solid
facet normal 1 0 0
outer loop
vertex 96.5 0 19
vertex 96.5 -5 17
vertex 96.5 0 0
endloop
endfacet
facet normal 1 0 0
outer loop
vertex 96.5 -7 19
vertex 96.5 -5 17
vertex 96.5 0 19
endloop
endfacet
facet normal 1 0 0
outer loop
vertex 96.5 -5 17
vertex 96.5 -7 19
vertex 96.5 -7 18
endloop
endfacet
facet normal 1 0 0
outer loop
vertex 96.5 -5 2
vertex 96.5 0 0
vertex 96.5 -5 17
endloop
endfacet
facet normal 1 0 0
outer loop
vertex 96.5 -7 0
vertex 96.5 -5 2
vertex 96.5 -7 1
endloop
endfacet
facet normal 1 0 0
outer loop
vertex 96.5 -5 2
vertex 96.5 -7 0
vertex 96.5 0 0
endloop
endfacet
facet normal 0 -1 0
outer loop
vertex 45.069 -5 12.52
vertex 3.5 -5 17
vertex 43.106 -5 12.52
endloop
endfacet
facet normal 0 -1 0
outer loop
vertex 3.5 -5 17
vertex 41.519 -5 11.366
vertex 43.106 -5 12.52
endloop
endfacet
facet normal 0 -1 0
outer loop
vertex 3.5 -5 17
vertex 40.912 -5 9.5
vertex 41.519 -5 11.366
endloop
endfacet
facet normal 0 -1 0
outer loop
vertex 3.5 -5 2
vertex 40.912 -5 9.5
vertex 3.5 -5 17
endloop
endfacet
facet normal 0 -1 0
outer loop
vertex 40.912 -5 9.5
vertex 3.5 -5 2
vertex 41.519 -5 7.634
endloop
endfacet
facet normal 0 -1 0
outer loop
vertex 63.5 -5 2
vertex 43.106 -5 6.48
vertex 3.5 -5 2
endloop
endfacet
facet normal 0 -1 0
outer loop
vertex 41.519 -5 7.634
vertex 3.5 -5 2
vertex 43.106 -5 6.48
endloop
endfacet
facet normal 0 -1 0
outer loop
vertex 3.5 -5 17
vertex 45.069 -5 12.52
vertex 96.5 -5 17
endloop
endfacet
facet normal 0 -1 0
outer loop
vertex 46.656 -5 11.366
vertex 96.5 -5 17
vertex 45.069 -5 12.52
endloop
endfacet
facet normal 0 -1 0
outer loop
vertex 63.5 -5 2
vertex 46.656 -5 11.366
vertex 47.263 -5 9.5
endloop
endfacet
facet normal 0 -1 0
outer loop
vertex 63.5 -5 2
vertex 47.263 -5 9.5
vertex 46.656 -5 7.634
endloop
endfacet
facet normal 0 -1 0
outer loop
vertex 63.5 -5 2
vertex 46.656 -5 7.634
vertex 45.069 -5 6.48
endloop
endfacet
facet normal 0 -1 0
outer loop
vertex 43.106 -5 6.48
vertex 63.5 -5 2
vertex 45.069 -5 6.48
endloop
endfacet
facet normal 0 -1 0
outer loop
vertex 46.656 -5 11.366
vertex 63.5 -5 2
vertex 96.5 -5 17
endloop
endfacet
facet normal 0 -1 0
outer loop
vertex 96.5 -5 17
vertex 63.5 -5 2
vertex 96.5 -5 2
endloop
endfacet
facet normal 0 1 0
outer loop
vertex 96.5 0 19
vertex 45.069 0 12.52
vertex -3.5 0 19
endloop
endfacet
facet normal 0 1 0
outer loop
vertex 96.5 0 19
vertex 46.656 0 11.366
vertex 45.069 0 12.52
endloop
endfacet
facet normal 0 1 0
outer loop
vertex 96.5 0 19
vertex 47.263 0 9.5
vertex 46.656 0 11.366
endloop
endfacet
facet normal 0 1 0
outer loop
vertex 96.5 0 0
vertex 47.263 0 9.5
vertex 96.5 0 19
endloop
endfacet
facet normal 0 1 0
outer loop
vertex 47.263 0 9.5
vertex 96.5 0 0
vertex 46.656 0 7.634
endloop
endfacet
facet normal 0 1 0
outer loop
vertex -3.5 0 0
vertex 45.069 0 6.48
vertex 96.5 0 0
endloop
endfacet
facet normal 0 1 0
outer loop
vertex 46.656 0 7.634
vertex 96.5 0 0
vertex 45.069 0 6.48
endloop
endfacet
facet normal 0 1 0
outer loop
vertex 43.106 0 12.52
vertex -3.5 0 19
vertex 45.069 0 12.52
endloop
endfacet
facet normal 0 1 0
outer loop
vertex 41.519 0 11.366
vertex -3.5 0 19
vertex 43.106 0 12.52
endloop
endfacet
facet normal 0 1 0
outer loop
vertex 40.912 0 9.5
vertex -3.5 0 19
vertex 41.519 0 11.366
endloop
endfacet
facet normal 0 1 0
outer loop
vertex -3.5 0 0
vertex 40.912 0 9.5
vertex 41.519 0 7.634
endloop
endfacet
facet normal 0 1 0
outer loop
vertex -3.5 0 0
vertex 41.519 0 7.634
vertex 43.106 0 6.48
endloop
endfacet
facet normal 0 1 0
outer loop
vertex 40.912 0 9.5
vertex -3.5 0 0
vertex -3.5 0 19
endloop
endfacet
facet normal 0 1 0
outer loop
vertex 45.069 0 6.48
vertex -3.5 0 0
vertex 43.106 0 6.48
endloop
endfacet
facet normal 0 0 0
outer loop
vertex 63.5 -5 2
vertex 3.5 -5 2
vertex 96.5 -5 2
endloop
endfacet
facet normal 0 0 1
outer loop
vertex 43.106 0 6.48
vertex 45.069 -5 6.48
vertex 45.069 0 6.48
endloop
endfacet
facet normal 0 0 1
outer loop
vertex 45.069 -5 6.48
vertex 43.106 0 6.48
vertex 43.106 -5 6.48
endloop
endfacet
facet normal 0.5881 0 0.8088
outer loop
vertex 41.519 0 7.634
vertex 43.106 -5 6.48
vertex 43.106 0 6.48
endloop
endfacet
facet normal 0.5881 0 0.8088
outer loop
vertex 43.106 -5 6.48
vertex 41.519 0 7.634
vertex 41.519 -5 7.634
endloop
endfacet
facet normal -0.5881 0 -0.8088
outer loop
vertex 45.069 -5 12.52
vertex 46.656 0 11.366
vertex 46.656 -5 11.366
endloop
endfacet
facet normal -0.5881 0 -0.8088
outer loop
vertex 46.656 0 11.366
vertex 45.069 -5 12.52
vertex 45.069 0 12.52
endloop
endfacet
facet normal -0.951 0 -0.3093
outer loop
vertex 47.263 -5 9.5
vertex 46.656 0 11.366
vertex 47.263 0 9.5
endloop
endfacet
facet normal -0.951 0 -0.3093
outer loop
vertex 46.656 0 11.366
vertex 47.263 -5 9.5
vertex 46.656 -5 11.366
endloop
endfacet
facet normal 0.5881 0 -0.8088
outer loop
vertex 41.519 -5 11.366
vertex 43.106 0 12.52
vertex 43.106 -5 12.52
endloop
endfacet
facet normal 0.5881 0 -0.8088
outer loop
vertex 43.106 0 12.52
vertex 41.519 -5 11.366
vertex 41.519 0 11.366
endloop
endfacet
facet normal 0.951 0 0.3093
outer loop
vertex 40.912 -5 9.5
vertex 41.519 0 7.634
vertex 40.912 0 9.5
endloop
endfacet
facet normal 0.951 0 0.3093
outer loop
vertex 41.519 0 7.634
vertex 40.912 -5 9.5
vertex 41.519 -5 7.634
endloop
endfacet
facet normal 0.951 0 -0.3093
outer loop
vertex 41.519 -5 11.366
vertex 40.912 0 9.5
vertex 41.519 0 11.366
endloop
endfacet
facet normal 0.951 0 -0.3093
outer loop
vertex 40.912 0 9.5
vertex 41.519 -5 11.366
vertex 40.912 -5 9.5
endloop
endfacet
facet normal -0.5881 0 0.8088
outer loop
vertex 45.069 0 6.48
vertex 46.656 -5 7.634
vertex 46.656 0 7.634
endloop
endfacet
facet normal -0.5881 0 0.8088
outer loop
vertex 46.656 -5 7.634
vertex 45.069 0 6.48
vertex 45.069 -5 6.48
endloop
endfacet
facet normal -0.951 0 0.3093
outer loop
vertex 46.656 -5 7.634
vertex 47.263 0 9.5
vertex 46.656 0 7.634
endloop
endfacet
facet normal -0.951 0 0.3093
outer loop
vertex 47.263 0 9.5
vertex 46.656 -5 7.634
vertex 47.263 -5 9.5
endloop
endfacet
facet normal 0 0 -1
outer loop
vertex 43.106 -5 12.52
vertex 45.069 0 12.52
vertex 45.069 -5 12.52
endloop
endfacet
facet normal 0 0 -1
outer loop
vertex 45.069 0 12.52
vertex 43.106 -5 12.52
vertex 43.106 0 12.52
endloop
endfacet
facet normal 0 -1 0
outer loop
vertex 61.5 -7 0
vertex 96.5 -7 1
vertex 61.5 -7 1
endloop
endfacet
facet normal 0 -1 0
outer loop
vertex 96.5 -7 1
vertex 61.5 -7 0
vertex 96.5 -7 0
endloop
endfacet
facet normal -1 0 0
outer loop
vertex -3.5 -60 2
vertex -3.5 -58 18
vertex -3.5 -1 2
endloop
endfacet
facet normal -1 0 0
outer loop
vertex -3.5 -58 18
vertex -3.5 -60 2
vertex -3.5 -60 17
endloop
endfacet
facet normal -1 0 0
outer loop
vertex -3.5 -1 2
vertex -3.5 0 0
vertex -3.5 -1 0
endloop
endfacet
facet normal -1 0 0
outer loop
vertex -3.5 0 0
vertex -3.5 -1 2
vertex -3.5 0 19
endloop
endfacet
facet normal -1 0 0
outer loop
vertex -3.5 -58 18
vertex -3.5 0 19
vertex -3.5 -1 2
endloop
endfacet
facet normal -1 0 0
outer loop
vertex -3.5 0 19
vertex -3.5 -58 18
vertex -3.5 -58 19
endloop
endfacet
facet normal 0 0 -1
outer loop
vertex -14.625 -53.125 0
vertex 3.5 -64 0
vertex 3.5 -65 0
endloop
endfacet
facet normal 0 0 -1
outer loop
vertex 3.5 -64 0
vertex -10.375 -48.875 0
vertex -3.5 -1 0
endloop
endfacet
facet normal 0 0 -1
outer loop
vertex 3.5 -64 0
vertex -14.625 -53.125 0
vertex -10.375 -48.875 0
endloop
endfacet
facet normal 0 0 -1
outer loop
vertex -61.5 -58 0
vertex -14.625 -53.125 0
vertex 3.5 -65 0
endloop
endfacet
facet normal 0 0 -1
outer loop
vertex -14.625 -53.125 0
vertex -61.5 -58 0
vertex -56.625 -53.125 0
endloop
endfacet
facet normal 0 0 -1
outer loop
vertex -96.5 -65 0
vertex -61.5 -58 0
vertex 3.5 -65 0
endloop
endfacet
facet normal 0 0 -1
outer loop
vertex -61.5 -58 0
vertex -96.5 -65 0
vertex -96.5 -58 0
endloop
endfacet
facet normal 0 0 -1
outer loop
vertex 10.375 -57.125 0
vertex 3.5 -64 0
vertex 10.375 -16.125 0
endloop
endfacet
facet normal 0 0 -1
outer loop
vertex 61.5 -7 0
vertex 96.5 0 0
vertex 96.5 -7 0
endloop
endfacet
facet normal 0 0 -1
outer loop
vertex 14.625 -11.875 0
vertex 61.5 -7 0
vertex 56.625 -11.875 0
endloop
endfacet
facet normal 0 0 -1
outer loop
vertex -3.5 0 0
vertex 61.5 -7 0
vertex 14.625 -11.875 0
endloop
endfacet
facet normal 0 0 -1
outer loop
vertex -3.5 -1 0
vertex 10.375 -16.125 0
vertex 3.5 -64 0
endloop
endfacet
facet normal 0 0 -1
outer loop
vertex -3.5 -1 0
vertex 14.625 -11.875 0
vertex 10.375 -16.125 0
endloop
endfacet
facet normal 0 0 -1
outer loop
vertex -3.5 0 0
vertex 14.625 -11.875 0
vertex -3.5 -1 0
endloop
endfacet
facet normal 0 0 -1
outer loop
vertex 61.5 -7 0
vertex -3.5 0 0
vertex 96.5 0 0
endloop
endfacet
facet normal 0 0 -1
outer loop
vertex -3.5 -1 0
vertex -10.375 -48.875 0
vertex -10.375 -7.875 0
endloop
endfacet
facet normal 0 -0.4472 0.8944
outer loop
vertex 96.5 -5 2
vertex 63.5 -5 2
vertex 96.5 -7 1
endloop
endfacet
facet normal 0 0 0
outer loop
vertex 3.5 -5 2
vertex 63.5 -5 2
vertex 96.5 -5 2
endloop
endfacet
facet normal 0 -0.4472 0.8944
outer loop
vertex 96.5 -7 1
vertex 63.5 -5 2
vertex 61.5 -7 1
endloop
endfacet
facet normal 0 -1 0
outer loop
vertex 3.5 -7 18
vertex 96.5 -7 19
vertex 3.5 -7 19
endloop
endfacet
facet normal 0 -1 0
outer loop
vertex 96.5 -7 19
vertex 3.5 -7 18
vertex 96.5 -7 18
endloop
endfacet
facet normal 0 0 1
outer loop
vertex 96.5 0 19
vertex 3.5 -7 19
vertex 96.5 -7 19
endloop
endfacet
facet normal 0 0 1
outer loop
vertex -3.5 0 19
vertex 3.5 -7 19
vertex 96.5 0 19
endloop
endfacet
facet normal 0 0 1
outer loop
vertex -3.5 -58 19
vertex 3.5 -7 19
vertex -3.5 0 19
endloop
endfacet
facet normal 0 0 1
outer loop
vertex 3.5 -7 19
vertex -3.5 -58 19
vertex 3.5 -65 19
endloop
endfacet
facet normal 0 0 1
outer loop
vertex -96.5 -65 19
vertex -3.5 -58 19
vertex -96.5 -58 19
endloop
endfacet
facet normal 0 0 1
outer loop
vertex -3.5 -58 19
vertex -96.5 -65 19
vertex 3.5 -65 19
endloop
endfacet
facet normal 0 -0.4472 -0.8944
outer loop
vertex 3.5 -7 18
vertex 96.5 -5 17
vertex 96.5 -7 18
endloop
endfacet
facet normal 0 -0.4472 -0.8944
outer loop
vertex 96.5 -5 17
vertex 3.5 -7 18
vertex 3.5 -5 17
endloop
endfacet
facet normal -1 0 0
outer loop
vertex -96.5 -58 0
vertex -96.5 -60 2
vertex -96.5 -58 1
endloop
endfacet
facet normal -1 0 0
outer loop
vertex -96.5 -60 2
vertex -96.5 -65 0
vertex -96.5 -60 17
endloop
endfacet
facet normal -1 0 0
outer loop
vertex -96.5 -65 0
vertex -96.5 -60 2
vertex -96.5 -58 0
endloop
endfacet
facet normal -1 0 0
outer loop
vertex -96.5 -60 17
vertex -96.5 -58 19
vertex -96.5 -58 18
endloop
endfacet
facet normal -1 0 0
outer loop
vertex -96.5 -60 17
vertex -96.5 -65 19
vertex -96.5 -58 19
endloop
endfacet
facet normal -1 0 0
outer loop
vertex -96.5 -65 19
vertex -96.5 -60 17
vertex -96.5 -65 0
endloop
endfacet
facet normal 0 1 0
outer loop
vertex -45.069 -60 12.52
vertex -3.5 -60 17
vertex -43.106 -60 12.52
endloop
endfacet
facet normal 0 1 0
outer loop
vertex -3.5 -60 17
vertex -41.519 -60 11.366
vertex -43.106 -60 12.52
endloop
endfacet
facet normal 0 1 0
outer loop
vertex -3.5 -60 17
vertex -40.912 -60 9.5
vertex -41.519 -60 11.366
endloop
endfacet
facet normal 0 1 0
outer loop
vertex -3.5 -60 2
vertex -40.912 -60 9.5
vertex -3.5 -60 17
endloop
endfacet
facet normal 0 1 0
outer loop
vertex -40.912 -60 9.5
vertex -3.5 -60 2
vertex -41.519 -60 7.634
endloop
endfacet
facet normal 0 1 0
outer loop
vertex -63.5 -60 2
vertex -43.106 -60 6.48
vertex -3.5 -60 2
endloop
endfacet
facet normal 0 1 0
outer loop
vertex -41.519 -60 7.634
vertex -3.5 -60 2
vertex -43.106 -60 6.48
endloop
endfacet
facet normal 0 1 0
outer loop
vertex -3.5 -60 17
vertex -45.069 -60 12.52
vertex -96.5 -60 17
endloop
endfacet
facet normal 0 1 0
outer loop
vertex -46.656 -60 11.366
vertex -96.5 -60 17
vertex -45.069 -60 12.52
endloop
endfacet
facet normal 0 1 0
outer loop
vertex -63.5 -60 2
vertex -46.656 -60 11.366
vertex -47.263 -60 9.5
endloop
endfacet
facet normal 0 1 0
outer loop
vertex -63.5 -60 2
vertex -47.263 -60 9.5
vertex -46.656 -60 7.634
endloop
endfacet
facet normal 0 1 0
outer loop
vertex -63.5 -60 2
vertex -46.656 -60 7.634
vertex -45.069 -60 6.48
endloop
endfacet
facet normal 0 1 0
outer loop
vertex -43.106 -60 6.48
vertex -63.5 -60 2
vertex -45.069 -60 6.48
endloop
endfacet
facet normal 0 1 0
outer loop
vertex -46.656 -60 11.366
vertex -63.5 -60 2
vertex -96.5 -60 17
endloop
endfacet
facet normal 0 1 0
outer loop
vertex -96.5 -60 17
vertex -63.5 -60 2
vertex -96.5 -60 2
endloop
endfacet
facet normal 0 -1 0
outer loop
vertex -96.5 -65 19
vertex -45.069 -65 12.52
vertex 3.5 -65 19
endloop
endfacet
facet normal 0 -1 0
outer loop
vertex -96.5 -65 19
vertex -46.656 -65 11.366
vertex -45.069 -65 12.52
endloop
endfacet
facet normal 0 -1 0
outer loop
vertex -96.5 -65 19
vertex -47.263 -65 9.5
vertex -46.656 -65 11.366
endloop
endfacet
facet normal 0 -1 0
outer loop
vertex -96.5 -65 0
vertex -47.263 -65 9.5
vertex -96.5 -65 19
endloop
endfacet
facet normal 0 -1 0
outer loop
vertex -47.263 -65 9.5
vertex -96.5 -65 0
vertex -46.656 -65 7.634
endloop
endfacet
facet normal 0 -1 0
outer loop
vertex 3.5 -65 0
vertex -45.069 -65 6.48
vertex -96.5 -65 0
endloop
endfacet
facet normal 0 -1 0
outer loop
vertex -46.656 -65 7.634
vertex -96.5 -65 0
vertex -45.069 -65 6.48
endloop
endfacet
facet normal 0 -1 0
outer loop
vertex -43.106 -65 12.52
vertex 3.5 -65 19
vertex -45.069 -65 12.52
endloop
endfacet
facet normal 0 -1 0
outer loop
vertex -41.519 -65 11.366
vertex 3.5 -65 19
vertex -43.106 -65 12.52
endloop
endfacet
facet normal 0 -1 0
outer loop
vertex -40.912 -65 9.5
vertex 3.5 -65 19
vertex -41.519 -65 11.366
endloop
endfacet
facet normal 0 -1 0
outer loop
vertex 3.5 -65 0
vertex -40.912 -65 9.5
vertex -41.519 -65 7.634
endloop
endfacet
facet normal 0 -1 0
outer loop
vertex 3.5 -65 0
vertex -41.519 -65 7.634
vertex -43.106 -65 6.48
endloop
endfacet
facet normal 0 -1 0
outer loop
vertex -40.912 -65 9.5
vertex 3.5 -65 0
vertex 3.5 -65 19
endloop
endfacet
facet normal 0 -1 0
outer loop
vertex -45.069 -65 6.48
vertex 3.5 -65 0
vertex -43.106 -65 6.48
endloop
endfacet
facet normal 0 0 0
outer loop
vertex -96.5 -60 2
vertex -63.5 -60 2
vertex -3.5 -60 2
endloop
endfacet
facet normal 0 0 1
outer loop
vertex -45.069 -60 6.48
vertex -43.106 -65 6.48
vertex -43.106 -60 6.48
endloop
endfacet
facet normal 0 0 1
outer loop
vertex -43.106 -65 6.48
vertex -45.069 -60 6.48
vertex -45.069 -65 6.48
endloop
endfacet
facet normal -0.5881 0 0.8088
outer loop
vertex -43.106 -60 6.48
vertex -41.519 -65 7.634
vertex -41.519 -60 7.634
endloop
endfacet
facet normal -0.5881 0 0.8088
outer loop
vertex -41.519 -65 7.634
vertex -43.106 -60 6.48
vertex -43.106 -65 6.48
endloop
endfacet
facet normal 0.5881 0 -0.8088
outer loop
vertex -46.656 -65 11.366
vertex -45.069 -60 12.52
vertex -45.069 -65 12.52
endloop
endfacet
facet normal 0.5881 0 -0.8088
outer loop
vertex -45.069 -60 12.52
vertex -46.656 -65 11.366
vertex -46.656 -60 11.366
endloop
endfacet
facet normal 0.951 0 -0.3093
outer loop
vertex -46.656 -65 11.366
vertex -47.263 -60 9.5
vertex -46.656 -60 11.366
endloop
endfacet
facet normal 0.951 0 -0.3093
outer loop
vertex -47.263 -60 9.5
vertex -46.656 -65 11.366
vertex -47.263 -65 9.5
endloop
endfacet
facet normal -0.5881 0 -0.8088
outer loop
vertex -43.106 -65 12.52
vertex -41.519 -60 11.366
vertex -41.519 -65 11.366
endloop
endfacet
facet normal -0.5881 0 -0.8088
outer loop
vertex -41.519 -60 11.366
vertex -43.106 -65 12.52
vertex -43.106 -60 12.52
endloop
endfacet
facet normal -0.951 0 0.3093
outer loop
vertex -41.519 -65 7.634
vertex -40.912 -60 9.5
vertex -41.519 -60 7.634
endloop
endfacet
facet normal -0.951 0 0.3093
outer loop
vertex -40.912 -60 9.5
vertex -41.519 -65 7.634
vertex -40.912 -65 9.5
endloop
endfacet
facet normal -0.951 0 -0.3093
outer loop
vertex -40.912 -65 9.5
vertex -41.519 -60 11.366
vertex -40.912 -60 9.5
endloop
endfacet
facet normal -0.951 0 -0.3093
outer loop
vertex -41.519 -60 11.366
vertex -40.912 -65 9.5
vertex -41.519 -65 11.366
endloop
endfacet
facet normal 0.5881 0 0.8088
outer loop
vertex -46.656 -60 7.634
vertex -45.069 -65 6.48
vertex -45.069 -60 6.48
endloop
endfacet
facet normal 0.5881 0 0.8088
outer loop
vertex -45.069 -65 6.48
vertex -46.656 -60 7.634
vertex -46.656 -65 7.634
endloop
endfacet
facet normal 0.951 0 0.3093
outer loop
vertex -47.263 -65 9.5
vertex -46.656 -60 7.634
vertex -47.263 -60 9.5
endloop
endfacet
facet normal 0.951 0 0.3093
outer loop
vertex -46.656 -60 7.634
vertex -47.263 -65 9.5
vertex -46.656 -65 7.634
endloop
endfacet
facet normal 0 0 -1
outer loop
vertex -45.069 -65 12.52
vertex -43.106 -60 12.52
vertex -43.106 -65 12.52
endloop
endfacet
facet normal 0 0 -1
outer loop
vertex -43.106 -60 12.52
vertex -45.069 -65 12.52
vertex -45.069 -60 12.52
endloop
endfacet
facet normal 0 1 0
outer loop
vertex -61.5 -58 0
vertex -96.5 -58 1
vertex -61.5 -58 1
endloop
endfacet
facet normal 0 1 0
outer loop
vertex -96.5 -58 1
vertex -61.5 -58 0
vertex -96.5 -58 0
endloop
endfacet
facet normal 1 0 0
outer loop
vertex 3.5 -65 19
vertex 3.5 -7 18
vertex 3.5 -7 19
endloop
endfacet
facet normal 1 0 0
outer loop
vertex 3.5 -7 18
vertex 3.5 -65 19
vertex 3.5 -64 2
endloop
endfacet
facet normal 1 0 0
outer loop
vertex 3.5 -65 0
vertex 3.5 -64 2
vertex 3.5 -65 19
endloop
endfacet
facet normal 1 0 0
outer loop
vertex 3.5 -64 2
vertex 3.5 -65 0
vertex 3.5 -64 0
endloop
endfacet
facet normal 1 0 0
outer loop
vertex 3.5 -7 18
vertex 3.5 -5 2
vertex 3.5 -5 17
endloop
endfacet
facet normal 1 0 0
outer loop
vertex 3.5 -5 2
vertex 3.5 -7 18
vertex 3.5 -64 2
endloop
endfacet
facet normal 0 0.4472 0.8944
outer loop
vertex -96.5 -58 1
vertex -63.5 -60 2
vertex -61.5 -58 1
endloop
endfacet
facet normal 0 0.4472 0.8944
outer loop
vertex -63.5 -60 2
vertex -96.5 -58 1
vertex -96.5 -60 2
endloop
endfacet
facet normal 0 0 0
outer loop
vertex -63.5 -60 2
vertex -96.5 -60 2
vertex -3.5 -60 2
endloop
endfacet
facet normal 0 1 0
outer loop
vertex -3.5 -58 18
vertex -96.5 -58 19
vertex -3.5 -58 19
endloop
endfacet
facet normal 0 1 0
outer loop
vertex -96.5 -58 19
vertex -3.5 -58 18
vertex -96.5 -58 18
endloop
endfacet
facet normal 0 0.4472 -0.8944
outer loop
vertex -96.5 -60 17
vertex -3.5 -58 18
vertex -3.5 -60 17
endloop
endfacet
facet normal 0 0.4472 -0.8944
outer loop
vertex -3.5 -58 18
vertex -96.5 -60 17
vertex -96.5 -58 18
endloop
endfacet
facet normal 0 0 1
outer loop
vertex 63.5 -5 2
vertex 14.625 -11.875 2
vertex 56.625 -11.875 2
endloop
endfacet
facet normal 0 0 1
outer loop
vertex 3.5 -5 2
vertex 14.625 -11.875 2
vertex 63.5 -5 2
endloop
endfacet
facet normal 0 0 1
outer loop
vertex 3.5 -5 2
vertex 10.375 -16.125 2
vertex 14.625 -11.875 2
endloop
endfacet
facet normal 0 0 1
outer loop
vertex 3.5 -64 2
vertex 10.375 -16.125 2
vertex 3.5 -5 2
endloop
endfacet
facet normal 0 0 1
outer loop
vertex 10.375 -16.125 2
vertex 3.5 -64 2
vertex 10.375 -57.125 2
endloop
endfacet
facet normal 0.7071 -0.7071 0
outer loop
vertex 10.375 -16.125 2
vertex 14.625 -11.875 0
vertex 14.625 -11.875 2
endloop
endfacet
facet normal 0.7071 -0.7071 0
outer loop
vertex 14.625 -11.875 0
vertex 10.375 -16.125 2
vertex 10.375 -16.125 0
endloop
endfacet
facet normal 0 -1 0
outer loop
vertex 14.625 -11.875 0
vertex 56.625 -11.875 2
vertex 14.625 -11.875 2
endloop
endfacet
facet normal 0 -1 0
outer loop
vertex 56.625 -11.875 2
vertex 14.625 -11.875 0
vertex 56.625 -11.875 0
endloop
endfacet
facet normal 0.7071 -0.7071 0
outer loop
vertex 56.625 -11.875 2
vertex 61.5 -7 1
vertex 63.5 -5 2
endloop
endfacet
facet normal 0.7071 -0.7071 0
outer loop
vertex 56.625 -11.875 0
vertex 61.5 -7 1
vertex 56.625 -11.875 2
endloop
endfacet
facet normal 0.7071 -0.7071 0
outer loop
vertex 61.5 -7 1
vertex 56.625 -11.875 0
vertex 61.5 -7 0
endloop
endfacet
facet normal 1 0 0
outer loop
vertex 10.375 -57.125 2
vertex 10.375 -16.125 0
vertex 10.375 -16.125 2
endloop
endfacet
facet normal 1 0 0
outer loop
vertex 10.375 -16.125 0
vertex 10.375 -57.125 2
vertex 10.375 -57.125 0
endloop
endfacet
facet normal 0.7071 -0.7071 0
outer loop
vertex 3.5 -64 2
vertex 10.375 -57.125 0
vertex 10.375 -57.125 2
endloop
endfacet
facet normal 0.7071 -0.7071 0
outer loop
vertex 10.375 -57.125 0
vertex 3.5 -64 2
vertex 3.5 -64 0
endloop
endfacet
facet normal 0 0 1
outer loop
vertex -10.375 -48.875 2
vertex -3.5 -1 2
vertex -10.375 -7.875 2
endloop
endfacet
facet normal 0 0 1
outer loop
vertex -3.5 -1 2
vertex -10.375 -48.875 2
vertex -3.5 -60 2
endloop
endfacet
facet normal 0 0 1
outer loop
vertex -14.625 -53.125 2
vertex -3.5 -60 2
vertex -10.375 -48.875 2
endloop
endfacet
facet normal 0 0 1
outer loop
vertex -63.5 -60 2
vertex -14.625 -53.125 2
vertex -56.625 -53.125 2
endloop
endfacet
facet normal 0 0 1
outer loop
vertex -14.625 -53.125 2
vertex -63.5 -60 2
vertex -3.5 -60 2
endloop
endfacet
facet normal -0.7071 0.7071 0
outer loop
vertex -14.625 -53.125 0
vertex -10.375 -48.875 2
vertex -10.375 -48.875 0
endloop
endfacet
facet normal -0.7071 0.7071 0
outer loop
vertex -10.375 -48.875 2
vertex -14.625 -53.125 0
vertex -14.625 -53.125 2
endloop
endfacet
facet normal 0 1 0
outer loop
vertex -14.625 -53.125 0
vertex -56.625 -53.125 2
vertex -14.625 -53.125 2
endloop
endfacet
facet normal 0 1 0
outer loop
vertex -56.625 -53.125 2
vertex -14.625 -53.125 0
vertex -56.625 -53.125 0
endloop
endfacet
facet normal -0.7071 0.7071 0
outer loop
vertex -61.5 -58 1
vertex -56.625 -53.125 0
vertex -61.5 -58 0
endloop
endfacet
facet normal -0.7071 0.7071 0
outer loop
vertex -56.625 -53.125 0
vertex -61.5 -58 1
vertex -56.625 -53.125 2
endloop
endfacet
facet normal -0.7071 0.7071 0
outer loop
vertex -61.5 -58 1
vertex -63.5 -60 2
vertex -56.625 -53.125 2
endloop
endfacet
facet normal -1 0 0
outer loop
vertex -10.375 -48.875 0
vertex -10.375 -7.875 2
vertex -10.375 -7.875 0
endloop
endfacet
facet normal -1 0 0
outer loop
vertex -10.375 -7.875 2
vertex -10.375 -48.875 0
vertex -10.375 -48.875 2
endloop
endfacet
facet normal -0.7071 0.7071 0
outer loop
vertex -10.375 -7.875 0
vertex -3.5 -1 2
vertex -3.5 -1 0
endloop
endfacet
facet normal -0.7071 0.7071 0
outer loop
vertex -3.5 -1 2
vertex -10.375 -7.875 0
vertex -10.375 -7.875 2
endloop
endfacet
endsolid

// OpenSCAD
//
//  
//
//  default camera dimensions are for Canon SD1400

// length of camera
camera_length = 93;
// measure from bottom of camera to center of lens
camera_lens_center_offset = 27;
// this needs to adjust based on lens offset...
camera_height = 56;
// distance from (rear) left edge of camera to center of mount screw hole
camera_screw_offset=39;
// thickness of camera...might tweak smaller for rounded bottoms
camera_thickness = 15;

//
camera_bar_width = camera_thickness;
// arbitrary...how thick you want it?
camera_bar_thickness = 5;

// stiffness matters, so does offset to inter-lens spacing
center_pillar_width = 7.0;
// center pillar is set to make sure lens centers line up,
// using math in case offset != 1/2 height
center_pillar_height = camera_height - ((camera_height - (camera_lens_center_offset * 2.0))/2);

// 1/4"-20 screw hole
screw_width=.25/2.0 * 25.4;

//arbitrary...width of bracing, should be enough to hold camera square, 
// but not interfere with buttons 
brace_width=15;
brace_length=60;

// include bracing???
include_corner_brace=true;
// include end pieces???
include_ends=false;

// lip for camera rail
module side_rail() {
        scale ([camera_length+center_pillar_width,2,camera_bar_thickness+2])
        cube(1);
}

// rail with 45 degree chamfer on top edge
module chamfered_side_rail() {
      difference (){
        side_rail();
        translate([0,1,camera_bar_thickness+2]) 
        scale([camera_length+center_pillar_width,1.5,3])
        rotate([-45,0,0])  
        cube(1);
    }
}

module camera_rail() 
{ 
    union() {
        difference (){
            scale([camera_length + center_pillar_width/2.0,camera_bar_width,camera_bar_thickness]) cube(1); 
            translate([camera_screw_offset+center_pillar_width/2.0+screw_width/2.0,camera_bar_width/2,2]) cylinder(h=camera_bar_width/2,r1=screw_width,r2=screw_width,center=true);
        }
        
        translate([-center_pillar_width/2,-2,0]) chamfered_side_rail() ;
        mirror([0,1,0])
    translate([-center_pillar_width/2,-camera_bar_width-2,0]) 
        chamfered_side_rail();
    }
    if (include_ends==true) {
        translate([center_pillar_width/2+camera_length,-2,0])
        scale([camera_bar_thickness,camera_thickness+4, center_pillar_height+camera_bar_thickness*2])
        cube(1);
    }
}

// center pillar
module center_pillar() {
    translate([-center_pillar_width/2,-2,0])
    scale([center_pillar_width,camera_bar_width+4,center_pillar_height+camera_bar_thickness*2]) cube(1);

}

// the whole assembly
module camera_z_bar() {
    union () {
        camera_rail();
        translate([0,0,center_pillar_height+camera_bar_thickness*2]) 
        rotate([0,180,0]) 
        camera_rail();
        center_pillar() ;
        if (include_corner_brace==true) {
            corner_brace();
            translate([0,0,center_pillar_height+camera_bar_thickness*2])
            rotate([0,180,0])
            corner_brace();
        }
    }
}

// corner bracing
module corner_brace() {
    union () {
        // corner bit
        difference () {
            translate([center_pillar_width/2,-2,camera_bar_thickness])
            scale([brace_width,2,center_pillar_height/3])
            cube(1);

            translate([brace_width*1.4,-3,center_pillar_height/10])
            rotate([0,-45,0])
            scale([brace_width+2,4,center_pillar_height/2])
            cube(1);
        }
        // horizontal bit
        difference() {
            translate([center_pillar_width/2,-2,camera_bar_thickness])
            scale([brace_length,2,center_pillar_height/8])
            cube(1);
            
            translate([brace_length + center_pillar_width/2,-3,camera_bar_thickness])
            scale([brace_length,4,brace_length])
            rotate([0,-45,0])
            cube(1);
        }
        // vertical bit
        difference() {
            translate([center_pillar_width/2,-2,camera_bar_thickness])
            scale([center_pillar_height/8,2,brace_length])
            cube(1);
            
            translate([brace_width,-3,brace_length-brace_width/2])
            scale([brace_length,4,brace_length])
            rotate([0,-45,0])
            cube(1);
        }
    }
}

// manifest it
rotate([90,0,0])
translate([0,2,0])
camera_z_bar();
